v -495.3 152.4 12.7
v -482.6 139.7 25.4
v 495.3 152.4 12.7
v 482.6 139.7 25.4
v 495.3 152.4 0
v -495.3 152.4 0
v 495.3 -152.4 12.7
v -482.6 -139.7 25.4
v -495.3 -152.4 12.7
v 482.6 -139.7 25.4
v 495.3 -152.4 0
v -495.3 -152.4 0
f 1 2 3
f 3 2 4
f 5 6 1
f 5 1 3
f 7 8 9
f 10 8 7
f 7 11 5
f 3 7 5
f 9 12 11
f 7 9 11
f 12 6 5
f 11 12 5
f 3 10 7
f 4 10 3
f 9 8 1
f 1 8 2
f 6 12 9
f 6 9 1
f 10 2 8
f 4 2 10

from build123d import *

# Parameters (mm, degrees)
PROFILE_SKETCH_W      = 990.6
PROFILE_SKETCH_H      = 304.8
PROFILE_EXTRUDE_DEPTH = 25.4
EDGE_CHAMFER_SIZE     = 12.7


with BuildPart() as part:
    # Profile Sketch → Profile Extrude (new body)
    with BuildSketch(Plane.XY):
        Rectangle(PROFILE_SKETCH_W, PROFILE_SKETCH_H)
    extrude(amount=PROFILE_EXTRUDE_DEPTH)

    # Edge Chamfer
    edge_chamfer_edges = [part.edges().sort_by_distance(p)[0] for p in [
        (-495.3, 0, 25.4),
        (0, -152.4, 25.4),
        (495.3, 0, 25.4),
        (0, 152.4, 25.4),
    ]]
    chamfer(edge_chamfer_edges, length=EDGE_CHAMFER_SIZE)


solid = part.part
